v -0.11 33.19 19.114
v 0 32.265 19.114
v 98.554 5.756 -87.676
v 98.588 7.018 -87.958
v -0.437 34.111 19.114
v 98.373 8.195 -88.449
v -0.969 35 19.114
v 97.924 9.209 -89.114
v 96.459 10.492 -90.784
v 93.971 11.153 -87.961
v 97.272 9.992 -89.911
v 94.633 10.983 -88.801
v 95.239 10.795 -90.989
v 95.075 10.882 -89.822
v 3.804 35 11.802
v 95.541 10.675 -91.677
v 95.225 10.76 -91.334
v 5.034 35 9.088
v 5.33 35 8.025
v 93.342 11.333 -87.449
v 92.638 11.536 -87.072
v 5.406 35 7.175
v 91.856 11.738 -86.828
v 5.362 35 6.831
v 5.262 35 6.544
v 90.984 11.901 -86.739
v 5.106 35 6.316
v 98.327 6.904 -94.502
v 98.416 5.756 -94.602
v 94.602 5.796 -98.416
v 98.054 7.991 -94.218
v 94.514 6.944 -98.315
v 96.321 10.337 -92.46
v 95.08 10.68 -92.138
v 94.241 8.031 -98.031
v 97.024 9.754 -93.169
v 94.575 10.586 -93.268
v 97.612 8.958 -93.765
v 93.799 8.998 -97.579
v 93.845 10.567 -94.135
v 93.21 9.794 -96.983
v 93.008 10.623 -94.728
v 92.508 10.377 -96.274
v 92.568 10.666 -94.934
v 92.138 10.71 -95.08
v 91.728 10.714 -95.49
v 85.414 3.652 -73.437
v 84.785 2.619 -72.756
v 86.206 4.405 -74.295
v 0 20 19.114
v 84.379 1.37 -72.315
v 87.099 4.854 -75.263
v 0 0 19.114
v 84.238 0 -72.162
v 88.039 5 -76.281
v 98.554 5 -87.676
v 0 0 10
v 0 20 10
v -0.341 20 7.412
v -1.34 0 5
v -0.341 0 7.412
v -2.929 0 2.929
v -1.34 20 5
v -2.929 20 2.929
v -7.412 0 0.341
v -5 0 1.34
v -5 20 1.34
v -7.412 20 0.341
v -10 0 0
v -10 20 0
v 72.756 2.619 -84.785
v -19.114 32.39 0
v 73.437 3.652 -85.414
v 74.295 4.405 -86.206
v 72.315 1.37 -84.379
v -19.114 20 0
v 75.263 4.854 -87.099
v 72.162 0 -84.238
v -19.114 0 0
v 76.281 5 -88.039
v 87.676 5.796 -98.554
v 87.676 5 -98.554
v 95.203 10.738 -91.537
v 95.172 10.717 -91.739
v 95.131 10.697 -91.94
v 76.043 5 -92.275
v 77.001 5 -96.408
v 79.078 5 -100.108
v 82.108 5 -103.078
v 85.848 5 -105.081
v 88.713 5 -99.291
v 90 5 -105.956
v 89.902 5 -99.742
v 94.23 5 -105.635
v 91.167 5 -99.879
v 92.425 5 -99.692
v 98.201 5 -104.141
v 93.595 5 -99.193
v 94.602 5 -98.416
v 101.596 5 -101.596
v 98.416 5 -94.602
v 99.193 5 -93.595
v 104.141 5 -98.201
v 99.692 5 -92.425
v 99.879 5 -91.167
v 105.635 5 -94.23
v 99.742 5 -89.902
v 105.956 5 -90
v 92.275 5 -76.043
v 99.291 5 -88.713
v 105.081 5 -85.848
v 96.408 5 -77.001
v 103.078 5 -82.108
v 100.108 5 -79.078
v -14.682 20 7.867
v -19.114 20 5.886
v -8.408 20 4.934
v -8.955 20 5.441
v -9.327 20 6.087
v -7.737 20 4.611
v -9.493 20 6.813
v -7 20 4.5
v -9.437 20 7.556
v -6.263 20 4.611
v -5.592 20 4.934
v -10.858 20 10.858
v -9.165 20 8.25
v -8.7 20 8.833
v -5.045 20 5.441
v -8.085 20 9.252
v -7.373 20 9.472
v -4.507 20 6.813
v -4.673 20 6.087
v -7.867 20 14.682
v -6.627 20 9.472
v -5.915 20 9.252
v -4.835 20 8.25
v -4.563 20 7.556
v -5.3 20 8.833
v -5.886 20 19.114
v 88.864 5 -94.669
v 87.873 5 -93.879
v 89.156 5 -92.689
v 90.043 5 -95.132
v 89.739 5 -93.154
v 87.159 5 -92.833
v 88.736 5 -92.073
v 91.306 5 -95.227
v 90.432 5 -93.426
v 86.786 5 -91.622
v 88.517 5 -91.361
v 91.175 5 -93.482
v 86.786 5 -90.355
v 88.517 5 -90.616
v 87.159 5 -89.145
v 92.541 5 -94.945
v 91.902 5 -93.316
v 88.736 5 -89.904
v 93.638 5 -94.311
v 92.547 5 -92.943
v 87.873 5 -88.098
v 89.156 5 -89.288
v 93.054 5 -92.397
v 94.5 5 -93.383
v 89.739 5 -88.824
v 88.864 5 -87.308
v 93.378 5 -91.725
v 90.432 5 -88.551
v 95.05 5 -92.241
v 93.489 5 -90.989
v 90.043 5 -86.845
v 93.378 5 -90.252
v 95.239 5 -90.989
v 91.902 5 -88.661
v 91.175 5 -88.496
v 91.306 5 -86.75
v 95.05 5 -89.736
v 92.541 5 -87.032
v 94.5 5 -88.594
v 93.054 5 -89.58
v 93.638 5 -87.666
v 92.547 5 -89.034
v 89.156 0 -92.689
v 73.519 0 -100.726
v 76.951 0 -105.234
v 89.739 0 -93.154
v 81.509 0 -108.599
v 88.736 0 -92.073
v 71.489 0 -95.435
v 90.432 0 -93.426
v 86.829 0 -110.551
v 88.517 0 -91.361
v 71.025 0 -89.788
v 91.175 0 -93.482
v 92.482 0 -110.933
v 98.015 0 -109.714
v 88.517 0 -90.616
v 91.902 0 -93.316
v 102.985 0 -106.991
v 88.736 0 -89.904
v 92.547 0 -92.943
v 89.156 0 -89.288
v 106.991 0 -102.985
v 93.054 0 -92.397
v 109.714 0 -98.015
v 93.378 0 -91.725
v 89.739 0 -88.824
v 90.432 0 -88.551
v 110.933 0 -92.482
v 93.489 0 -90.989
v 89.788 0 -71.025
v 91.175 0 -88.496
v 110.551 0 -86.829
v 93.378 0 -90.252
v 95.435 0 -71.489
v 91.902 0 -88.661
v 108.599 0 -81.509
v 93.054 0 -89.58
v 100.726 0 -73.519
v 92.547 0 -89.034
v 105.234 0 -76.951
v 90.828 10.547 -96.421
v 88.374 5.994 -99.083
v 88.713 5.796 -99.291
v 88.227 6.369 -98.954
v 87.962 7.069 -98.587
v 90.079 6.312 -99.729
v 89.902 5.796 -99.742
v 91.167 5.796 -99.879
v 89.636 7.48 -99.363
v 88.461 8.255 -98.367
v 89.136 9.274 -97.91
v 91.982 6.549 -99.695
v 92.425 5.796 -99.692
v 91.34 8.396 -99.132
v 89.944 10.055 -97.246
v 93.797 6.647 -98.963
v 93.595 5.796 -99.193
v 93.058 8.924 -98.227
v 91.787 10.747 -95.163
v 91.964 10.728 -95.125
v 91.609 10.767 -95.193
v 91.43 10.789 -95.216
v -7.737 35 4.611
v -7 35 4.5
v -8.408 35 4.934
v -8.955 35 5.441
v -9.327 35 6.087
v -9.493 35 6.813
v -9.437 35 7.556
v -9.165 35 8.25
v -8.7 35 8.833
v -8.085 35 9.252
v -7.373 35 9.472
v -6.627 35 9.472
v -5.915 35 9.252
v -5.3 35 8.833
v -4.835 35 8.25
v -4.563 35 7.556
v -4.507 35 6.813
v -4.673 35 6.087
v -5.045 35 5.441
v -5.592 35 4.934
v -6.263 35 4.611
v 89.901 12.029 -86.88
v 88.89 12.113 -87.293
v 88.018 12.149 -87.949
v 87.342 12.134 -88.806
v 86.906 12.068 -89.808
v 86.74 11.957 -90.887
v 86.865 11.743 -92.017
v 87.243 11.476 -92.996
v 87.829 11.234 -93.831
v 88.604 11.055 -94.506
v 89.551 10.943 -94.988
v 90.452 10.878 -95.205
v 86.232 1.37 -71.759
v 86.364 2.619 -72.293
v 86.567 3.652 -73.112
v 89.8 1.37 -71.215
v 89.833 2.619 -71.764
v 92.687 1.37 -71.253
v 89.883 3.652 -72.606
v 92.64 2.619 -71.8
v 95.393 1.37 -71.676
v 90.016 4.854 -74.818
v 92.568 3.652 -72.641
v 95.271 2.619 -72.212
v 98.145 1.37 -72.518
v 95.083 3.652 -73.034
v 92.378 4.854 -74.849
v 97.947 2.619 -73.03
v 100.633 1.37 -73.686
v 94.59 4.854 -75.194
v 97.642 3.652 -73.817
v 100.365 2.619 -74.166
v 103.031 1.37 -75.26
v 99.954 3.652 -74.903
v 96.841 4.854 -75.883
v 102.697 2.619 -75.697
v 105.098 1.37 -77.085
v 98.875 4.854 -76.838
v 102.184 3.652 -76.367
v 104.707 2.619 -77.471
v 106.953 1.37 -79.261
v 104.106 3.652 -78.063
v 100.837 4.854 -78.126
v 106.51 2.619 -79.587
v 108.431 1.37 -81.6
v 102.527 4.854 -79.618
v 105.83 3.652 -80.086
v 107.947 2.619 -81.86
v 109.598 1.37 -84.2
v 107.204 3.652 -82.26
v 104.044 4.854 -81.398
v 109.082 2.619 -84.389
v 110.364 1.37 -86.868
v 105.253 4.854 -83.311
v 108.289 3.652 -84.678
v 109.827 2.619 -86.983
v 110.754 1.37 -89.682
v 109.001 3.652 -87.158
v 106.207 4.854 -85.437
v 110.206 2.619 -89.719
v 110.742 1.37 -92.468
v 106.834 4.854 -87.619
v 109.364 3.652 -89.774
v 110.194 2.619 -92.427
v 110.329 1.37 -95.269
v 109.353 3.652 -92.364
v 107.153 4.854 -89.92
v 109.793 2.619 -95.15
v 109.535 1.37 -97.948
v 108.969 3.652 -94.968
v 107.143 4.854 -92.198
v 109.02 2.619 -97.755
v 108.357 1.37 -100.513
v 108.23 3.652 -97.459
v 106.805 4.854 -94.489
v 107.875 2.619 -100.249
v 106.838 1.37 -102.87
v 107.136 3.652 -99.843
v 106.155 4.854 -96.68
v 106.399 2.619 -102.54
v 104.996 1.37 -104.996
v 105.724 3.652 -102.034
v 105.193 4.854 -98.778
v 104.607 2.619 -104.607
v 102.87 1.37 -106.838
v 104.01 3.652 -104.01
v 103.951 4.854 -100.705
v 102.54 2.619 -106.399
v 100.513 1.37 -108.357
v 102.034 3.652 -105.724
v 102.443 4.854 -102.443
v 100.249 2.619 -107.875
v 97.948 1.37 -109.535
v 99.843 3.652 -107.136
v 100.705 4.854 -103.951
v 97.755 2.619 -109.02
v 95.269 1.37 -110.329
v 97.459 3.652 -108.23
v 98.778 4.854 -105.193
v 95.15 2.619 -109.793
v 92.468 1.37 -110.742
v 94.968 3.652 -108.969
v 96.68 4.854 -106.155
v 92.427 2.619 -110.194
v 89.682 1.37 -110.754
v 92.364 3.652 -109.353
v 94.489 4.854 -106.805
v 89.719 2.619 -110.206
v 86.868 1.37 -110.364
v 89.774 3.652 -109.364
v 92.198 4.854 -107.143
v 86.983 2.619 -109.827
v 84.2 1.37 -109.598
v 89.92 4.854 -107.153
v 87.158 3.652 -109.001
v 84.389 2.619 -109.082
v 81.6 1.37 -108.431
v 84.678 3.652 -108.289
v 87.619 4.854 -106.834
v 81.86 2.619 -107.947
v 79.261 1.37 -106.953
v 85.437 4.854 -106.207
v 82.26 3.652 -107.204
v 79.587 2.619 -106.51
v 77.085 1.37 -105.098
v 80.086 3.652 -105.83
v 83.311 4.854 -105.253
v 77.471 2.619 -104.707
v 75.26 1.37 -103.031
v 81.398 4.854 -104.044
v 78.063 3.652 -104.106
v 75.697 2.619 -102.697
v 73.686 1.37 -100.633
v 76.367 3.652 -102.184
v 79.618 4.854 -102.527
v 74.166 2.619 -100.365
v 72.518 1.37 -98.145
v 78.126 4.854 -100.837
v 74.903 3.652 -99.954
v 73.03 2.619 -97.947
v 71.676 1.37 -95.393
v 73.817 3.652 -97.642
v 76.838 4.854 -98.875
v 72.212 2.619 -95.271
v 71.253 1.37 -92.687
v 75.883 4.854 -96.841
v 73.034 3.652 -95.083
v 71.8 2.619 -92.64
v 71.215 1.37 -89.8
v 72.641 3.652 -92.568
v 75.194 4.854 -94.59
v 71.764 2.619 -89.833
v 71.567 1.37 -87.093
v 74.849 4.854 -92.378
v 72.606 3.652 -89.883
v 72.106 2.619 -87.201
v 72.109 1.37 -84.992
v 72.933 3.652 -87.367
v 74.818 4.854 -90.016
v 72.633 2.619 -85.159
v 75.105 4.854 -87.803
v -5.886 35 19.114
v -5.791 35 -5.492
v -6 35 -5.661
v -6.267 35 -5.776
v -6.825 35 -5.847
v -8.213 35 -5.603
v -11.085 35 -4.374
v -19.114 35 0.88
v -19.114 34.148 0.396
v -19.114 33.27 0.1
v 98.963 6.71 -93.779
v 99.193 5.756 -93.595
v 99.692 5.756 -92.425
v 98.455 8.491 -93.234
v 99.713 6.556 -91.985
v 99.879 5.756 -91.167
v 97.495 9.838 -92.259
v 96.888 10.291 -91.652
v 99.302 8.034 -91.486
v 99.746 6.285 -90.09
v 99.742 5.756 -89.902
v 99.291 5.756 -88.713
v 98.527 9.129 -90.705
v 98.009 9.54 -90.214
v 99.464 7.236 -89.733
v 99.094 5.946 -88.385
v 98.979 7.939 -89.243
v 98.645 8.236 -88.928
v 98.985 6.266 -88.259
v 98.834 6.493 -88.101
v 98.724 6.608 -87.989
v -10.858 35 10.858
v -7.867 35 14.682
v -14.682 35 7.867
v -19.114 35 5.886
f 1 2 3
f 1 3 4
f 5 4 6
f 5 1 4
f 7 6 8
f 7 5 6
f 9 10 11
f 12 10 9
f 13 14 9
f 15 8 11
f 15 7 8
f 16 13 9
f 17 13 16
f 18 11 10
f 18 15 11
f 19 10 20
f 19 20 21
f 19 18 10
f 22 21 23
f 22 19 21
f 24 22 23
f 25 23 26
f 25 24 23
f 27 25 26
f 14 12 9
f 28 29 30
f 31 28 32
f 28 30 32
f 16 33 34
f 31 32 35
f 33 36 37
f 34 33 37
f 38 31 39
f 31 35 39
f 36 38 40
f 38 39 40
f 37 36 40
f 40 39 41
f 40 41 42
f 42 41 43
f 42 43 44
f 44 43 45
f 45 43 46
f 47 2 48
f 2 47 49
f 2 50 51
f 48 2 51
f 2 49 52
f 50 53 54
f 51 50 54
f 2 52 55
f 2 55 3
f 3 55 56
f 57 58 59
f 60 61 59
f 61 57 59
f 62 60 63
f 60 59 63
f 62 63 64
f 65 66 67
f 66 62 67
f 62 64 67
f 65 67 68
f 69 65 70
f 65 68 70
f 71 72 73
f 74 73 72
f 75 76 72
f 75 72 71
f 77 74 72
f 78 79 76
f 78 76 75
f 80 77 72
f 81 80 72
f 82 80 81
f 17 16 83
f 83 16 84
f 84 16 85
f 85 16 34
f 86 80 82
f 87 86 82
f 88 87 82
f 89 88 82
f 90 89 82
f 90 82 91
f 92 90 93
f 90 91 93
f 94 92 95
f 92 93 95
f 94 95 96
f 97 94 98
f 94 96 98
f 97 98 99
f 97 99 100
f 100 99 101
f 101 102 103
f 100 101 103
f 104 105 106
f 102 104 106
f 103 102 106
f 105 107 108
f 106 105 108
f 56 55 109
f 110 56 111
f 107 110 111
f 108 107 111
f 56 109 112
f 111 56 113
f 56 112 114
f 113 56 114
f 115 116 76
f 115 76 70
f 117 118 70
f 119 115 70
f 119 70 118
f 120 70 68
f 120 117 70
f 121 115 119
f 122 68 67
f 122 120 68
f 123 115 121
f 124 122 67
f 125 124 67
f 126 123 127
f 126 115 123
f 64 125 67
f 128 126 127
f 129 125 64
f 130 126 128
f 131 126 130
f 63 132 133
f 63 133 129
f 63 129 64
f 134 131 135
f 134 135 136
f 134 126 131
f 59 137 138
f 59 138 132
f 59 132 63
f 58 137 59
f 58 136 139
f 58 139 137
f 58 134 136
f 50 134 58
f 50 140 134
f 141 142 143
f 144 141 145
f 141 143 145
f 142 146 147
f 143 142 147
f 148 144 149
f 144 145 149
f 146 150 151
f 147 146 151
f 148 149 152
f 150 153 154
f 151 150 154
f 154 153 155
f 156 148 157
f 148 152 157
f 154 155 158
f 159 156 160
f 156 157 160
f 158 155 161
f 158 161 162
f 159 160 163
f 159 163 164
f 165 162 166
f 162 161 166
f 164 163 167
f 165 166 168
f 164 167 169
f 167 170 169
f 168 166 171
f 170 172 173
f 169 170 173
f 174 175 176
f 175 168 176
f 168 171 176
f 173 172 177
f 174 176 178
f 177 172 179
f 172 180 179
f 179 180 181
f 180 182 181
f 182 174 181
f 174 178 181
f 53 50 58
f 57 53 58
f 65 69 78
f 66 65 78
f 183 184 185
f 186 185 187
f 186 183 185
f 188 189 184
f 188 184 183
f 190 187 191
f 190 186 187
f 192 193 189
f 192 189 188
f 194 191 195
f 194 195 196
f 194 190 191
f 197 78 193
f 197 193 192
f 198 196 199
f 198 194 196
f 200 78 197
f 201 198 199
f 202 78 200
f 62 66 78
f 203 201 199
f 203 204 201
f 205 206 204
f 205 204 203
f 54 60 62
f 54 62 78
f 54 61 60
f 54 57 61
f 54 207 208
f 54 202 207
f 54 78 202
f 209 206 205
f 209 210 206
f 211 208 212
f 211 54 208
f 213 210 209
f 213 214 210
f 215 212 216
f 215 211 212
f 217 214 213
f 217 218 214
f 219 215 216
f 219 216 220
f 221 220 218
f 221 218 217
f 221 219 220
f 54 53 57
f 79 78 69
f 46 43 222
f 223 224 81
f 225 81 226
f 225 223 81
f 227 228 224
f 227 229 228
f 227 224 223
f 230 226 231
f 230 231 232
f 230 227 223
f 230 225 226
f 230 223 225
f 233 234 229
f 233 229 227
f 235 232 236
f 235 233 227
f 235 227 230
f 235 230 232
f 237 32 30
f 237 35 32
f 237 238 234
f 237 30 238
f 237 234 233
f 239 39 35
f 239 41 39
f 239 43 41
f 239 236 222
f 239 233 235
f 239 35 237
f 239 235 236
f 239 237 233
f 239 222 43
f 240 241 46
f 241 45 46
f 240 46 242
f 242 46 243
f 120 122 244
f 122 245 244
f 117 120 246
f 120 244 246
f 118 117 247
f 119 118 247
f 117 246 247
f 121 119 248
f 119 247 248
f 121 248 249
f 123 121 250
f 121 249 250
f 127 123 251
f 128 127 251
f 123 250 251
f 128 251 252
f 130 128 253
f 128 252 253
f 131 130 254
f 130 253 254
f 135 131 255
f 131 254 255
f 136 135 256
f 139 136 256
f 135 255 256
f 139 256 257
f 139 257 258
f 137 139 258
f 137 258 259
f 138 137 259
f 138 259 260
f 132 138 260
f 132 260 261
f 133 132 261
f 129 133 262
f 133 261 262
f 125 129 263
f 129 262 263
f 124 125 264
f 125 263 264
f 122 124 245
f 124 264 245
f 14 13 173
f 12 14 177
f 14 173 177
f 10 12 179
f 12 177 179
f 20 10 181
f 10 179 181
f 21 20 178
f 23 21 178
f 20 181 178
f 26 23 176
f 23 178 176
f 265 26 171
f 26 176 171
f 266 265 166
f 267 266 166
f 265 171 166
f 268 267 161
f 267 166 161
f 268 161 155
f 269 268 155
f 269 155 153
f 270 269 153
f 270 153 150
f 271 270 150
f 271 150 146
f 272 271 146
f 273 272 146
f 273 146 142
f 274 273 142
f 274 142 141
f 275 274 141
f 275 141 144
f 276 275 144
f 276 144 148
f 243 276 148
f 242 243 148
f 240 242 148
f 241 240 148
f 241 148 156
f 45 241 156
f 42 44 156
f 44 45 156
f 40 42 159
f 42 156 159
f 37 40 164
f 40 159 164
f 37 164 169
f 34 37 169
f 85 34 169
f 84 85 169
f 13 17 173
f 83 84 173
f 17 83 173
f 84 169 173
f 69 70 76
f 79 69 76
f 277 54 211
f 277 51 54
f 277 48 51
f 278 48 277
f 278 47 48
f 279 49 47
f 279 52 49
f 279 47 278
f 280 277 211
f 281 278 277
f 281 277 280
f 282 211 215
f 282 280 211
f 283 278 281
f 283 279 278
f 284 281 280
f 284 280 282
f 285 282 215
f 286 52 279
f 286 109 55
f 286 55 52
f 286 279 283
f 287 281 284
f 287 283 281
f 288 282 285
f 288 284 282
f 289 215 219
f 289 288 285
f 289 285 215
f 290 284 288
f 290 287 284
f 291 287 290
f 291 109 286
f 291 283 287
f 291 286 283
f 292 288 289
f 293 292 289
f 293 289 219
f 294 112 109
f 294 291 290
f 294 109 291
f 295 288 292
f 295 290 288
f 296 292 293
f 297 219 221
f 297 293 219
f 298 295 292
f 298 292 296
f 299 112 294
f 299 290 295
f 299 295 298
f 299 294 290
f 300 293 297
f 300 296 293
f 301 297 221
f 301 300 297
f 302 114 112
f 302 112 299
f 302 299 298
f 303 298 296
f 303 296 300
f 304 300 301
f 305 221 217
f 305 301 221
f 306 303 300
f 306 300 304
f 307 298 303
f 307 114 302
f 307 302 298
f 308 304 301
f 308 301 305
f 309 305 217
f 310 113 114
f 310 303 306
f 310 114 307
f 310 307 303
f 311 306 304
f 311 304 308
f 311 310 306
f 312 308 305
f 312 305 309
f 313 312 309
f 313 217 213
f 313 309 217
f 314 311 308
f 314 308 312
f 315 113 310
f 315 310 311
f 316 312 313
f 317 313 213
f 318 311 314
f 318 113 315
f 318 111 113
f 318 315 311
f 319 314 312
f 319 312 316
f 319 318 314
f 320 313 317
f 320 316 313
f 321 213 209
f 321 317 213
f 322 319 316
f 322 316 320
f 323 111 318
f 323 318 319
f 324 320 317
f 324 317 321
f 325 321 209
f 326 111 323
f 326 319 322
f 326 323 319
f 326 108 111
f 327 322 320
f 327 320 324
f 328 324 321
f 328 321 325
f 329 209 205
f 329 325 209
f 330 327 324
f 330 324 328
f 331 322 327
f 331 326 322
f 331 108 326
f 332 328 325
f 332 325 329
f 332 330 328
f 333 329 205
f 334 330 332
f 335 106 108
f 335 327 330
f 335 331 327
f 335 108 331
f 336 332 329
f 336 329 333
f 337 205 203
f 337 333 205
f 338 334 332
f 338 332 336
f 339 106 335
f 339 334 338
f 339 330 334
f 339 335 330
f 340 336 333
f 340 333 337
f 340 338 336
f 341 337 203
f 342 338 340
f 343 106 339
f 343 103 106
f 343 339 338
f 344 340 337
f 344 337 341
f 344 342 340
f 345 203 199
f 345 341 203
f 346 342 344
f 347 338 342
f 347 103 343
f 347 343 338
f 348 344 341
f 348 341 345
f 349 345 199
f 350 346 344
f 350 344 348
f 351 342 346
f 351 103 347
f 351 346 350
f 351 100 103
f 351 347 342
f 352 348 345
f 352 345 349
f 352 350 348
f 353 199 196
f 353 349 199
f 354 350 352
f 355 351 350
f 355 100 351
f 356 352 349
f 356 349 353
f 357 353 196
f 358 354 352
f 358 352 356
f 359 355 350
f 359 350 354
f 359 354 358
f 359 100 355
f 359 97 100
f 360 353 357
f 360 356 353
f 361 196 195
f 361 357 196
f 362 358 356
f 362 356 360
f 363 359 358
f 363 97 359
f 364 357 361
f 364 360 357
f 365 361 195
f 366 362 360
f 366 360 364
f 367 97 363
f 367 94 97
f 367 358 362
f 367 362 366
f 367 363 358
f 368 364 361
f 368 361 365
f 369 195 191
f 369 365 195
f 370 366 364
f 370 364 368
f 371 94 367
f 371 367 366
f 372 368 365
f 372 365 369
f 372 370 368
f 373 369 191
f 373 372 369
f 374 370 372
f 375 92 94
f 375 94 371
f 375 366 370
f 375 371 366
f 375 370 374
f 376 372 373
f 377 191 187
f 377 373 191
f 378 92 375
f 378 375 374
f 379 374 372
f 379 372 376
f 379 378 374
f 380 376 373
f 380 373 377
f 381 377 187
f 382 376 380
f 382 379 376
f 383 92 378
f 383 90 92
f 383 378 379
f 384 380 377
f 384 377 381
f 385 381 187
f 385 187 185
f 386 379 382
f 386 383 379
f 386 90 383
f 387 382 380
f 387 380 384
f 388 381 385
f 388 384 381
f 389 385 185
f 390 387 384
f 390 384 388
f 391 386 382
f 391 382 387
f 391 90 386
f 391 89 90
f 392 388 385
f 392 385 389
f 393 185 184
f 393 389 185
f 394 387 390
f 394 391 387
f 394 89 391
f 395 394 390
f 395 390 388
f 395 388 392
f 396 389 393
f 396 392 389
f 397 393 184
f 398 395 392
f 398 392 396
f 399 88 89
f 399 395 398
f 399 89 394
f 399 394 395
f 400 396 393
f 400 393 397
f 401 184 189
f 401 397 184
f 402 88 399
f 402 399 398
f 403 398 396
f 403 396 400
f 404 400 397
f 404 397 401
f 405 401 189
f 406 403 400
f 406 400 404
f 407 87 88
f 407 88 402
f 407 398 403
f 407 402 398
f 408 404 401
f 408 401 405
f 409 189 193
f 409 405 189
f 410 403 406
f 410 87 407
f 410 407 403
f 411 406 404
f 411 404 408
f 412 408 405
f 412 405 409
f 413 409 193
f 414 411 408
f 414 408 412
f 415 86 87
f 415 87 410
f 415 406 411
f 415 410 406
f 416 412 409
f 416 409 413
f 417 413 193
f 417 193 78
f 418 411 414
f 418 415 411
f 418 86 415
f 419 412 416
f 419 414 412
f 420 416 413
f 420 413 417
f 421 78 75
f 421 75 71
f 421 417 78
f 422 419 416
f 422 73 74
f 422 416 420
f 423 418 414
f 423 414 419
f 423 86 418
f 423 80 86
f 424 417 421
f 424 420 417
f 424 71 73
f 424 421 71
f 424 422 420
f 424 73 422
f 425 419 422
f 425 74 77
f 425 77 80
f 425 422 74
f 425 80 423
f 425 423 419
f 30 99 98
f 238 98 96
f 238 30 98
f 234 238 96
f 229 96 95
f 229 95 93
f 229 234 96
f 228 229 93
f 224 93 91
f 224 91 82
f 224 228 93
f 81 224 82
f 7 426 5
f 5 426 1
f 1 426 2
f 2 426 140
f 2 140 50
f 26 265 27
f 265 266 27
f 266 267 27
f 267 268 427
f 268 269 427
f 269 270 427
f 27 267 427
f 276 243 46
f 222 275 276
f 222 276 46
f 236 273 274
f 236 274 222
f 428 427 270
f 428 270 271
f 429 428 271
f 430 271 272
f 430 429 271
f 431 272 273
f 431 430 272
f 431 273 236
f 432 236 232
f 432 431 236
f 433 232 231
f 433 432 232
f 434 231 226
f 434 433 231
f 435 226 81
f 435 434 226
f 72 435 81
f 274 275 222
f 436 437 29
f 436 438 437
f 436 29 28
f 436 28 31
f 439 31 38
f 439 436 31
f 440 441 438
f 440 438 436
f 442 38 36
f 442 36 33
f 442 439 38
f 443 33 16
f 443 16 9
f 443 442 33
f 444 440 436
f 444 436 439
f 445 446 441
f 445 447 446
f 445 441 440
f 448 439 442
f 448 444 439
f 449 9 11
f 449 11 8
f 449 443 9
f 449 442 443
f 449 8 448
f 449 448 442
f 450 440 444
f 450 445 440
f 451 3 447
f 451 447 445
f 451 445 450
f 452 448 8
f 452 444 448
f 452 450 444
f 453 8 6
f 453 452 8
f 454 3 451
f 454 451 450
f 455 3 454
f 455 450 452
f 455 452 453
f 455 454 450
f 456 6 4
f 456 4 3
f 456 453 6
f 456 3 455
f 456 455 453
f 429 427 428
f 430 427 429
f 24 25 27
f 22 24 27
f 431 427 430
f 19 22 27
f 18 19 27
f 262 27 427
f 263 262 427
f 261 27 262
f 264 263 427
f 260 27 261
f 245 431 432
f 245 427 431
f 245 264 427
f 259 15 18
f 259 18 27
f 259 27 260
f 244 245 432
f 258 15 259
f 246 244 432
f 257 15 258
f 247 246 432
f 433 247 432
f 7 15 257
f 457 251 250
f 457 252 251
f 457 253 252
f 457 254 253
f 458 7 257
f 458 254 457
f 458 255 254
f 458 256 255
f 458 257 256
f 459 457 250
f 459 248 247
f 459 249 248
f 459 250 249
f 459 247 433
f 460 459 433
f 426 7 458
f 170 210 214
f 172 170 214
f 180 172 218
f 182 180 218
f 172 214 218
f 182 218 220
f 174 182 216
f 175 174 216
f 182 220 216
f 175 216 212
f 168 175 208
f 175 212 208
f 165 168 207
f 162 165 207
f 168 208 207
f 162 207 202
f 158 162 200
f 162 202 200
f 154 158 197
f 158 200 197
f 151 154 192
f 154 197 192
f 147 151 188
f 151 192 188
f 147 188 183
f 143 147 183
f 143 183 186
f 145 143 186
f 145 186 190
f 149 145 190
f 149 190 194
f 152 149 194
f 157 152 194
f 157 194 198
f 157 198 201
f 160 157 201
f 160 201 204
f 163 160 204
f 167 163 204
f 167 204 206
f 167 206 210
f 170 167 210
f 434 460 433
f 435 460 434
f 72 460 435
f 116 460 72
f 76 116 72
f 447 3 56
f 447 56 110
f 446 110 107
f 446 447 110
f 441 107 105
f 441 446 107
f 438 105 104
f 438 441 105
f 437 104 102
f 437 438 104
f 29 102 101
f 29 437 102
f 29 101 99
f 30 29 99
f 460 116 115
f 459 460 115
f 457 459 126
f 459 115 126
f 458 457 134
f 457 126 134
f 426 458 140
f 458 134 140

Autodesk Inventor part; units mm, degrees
ref_plane "YZ Plane" through (0, 0, 0) normal (1, 0, 0) x (0, 1, 0)
ref_plane "XZ Plane" through (0, 0, 0) normal (0, 1, 0) x (-1, 0, 0)
ref_plane "XY Plane" through (0, 0, 0) normal (0, 0, 1) x (1, 0, 0)
sketch "Sketch1" plane through (0, 0, 0) normal (0, 1, 0) x (-1, 0, 0)
  arc A0 (5, 25) -> (25, 5) centre (25, 25) ccw
  circle A1 centre (25, 25) radius 20
  arc A2 (0, 10) -> (10, 0) centre (10, 10) ccw
  circle A3 centre (10, 10) radius 10
  line L0 (5.8856, 19.1144) -> (0, 19.1144)
  line L1 (0, 90) -> (0, 10)
  line L2 (19.1144, 5.8856) -> (19.1144, 0)
  line L3 (10, 0) -> (190, 0)
  line L4 (0, 19.1144) -> (19.1144, 19.1144)
  line L5 (19.1144, 19.1144) -> (19.1144, 0)
  line L6 (19.1144, 0) -> (0, 0)
  line L7 (0, 0) -> (0, 19.1144)
  arc A4 (45, 75) -> (5, 75) centre (25, 75) ccw
  circle A5 centre (25, 75) radius 20
  line L8 (25, 75) -> (25, 25)
  line L9 (25, 75) -> (35, 75)
  line L10 (35, 75) -> (35, 50)
  line L11 (35, 50) -> (25, 50)
  line L12 (25, 50) -> (25, 75)
  circle A6 centre (25, 75) radius 20
  line L13 (19.1144, 80.8856) -> (19.1144, 100)
  line L14 (0, 80.8856) -> (19.1144, 80.8856)
  line L15 (0, 100) -> (0, 80.8856)
  line L16 (19.1144, 100) -> (0, 100)
  circle A7 centre (10, 90) radius 10
  line L17 (19.1144, 0) -> (169.1144, 0) construction
  line L18 (-101.8121, -91.2055) -> (-91.2055, -101.8121)
  line L19 (0, 0) -> (-96.5088, -96.5088)
  line L20 (-96.5088, -96.5088) -> (-91.2055, -101.8121)
  line L21 (-91.2055, -101.8121) -> (-101.8121, -91.2055)
  line L22 (-91.2055, -101.8121) -> (10.6066, 0)
  line L23 (-101.8121, -91.2055) -> (0, 10.6066)
  line L24 (0, 19.1144) -> (-101.8121, -91.2055)
  line L25 (19.1144, 0) -> (-91.2055, -101.8121)
  point P0 (19.1144, 5.8856)
  point P1 (5.8856, 19.1144)
  point P2 (10, 100)
  point P3 (5.8856, 80.8856)
  point P4 (19.1144, 94.1144)
  point P5 (5.8856, 19.1144)
  point P6 (19.1144, 5.8856)
  dimension "d0" = 10
  dimension "d1" = 25
extrude "Extrusion1" add sketch "Sketch1" along normal blind 35 contours A0 A3 A2 | A3 L1 L0 | L2 L3 A3 | L7 L19 L18 L23 L1 | A2 L6 L7 | L1 L23 L24 | L3 L22 L18 L19 L6 | L25 L22 L3
sketch "Sketch3" plane through (0, 0, 0) normal (0, -1, 0) x (1, 0, 0)
  arc A0 (-19.1144, 5.8856) -> (-5.8856, 19.1144) centre (-25, 25) ccw projected
  circle A1 centre (-25, 25) radius 20
  line L0 (0, 0) -> (-19.1144, 0)
  line L1 (-19.1144, 0) -> (-19.1144, 19.1144)
  line L2 (-19.1144, 19.1144) -> (0, 19.1144)
  line L3 (0, 19.1144) -> (0, 0)
  line L4 (91.2055, -101.8121) -> (-19.1144, 0) projected
  line L5 (-5.8856, 19.1144) -> (0, 19.1144) projected
  line L6 (-19.1144, 0) -> (0, 19.1144)
  line L7 (-19.1144, 19.1144) -> (0, 0)
  point P0 (-5.8856, 19.1144)
  point P1 (-19.1144, 5.8856)
extrude "Extrusion4" cut sketch "Sketch3" against normal blind 20 contours A0 L7 L6 L1 | A0 L2 L6 L7 | L6 L7 L0 | L6 L3 L7
fillet "Fillet2" radius 10 1 edges at (0, 10, 0)
sketch "Sketch6" plane through (91.2055, 0, -101.8121) normal (-0.6782, 0, -0.7349) x (-0.7349, 0, 0.6782)
  line L0 (150.1206, 20) -> (150.1206, 35) projected
  line L1 (150.1206, 35) -> (136.6046, 35)
  line L2 (0, 35) -> (150.1206, 35) projected
  line L3 (143.4227, 0) -> (150.1206, 0) projected
  line L4 (0, 35) -> (150.1206, 35)
  line L5 (150.1206, 35) -> (150.1206, 0)
  line L6 (150.1206, 0) -> (0, 0)
  line L7 (0, 0) -> (0, 35)
  line L8 (0, 0) -> (150.1206, 0) projected
  line L9 (0, 0) -> (0, 10)
  line L10 (0, 0) -> (10, 0) construction
  line L11 (0, 10) -> (136.6046, 35)
  line L12 (0, 10) -> (-15.7766, 7.1127)
  line L13 (-15.7766, 7.1127) -> (-15.4206, 35)
  line L14 (0, 0) -> (0, 35) projected
  line L15 (-15.4206, 35) -> (0, 35)
  point P0 (136.0739, 0)
  dimension "d22" = 13.516
  dimension "d23" = 10
  dimension "d24" = 90
extrude "Extrusion5" cut sketch "Sketch6" against normal through all contours L11 L7 L2 | L7 L12 L13 L15
sketch "Sketch7" plane through (0, 20, 0) normal (0, -1, 0) x (1, 0, 0)
  line L0 (0, 0) -> (200, 0)
  line L1 (200, 0) -> (200, 100)
  line L2 (200, 100) -> (0, 100)
  line L3 (0, 100) -> (0, 0)
  line L4 (0, 0) -> (7, 0)
  line L5 (7, 0) -> (7, 7)
  line L6 (7, 7) -> (0, 7)
  line L7 (0, 7) -> (0, 0)
  line L8 (200, 100) -> (193, 100)
  line L9 (193, 100) -> (193, 93)
  line L10 (193, 93) -> (200, 93)
  line L11 (200, 93) -> (200, 100)
  line L12 (7, 7) -> (193, 7)
  line L13 (193, 7) -> (193, 93)
  line L14 (193, 93) -> (7, 93)
  line L15 (7, 93) -> (7, 7)
  line L16 (0, 0) -> (-200, 0)
  line L17 (-200, 0) -> (-200, 100)
  line L18 (-200, 100) -> (0, 100)
  line L19 (0, 0) -> (-7, 0)
  line L20 (-7, 0) -> (-7, 7)
  line L21 (-7, 7) -> (0, 7)
  line L22 (-200, 100) -> (-193, 100)
  line L23 (-193, 100) -> (-193, 93)
  line L24 (-193, 93) -> (-200, 93)
  line L25 (-200, 93) -> (-200, 100)
  line L26 (-7, 7) -> (-193, 7)
  line L27 (-193, 7) -> (-193, 93)
  line L28 (-193, 93) -> (-7, 93)
  line L29 (-7, 93) -> (-7, 7)
  dimension "d27" = 200
  dimension "d28" = 100
  dimension "d29" = 7
  dimension "d30" = 7
  dimension "d31" = 7
  dimension "d32" = 7
hole "Hole1" at (-7, 20, 7) direction (0, 1, 0) diameter 5 end through all
fillet "Fillet3" radius 5 1 edges at (96.5088, 9.945, -96.5088)
fillet "Fillet4" radius 5 4 edges at (90.3527, 9.0335, -101.025) (91.2055, 2.9156, -101.8121) (101.025, 8.9228, -90.3527) (101.8121, 2.8606, -91.2055)
sketch "Sketch8" plane through (0, 0, 0) normal (0, -1, 0) x (1, 0, 0)
  line L0 (98.4155, -94.6021) -> (94.6021, -98.4155) projected
  line L1 (98.4155, -94.6021) -> (103.9755, -89.0422)
  line L2 (0, 19.1144) -> (98.5544, -87.6756) projected
  line L3 (98.5544, -87.6756) -> (108.5515, -97.6726)
  ellipse E0 centre (94.88, -91.0666) end of major axis (91.3445, -87.531) minor radius 0.0367 (98.4155, -94.6021) -> (95.5415, -91.677) ccw projected
  line L4 (98.4155, -94.6021) -> (90.1473, -102.8703)
  line L5 (87.6756, -98.5544) -> (-19.1144, 0) projected
  line L6 (87.6756, -98.5544) -> (92.1576, -103.0365)
  circle A0 centre (90.9886, -90.9886) radius 7.8068
  circle A1 centre (90.9886, -90.9886) radius 20
  point P0 (0, 0)
  point P1 (98.0828, -94.2471)
  point P2 (96.5088, -96.5088)
  dimension "d42" = 40
extrude "Extrusion6" add sketch "Sketch8" against normal blind 5 contours L1 L3 L2 A1 L5 L6 L4 L0 | E0 A0 L2 L3 L1 | L0 L4 L6 L5 A0 | A0 | L5 A1 L2 A0
fillet "Fillet5" radius 5 1 edges at (105.1307, 5, -105.1307)
sketch "Sketch9" plane through (0, 0, 0) normal (0, -1, 0) x (1, 0, 0)
  arc A0 (72.1624, -84.2376) -> (84.2376, -72.1624) centre (90.9886, -90.9886) ccw projected
  circle A1 centre (90.9886, -90.9886) radius 4.25
  point P0 (0, 0)
  dimension "d46" = 8.5
extrude "Extrusion7" cut sketch "Sketch9" against normal through all
sketch "Sketch10" plane through (0, 0, 0) normal (0, -1, 0) x (1, 0, 0)
  circle A0 centre (90.9886, -90.9886) radius 4.25 projected
  circle A1 centre (90.9886, -90.9886) radius 4.25
  circle A2 centre (90.9886, -90.9886) radius 2.5
  point P0 (0, 0)
  dimension "d49" = 5
extrude "Extrusion8" add sketch "Sketch10" against normal blind 5
properties part number "Noga"
